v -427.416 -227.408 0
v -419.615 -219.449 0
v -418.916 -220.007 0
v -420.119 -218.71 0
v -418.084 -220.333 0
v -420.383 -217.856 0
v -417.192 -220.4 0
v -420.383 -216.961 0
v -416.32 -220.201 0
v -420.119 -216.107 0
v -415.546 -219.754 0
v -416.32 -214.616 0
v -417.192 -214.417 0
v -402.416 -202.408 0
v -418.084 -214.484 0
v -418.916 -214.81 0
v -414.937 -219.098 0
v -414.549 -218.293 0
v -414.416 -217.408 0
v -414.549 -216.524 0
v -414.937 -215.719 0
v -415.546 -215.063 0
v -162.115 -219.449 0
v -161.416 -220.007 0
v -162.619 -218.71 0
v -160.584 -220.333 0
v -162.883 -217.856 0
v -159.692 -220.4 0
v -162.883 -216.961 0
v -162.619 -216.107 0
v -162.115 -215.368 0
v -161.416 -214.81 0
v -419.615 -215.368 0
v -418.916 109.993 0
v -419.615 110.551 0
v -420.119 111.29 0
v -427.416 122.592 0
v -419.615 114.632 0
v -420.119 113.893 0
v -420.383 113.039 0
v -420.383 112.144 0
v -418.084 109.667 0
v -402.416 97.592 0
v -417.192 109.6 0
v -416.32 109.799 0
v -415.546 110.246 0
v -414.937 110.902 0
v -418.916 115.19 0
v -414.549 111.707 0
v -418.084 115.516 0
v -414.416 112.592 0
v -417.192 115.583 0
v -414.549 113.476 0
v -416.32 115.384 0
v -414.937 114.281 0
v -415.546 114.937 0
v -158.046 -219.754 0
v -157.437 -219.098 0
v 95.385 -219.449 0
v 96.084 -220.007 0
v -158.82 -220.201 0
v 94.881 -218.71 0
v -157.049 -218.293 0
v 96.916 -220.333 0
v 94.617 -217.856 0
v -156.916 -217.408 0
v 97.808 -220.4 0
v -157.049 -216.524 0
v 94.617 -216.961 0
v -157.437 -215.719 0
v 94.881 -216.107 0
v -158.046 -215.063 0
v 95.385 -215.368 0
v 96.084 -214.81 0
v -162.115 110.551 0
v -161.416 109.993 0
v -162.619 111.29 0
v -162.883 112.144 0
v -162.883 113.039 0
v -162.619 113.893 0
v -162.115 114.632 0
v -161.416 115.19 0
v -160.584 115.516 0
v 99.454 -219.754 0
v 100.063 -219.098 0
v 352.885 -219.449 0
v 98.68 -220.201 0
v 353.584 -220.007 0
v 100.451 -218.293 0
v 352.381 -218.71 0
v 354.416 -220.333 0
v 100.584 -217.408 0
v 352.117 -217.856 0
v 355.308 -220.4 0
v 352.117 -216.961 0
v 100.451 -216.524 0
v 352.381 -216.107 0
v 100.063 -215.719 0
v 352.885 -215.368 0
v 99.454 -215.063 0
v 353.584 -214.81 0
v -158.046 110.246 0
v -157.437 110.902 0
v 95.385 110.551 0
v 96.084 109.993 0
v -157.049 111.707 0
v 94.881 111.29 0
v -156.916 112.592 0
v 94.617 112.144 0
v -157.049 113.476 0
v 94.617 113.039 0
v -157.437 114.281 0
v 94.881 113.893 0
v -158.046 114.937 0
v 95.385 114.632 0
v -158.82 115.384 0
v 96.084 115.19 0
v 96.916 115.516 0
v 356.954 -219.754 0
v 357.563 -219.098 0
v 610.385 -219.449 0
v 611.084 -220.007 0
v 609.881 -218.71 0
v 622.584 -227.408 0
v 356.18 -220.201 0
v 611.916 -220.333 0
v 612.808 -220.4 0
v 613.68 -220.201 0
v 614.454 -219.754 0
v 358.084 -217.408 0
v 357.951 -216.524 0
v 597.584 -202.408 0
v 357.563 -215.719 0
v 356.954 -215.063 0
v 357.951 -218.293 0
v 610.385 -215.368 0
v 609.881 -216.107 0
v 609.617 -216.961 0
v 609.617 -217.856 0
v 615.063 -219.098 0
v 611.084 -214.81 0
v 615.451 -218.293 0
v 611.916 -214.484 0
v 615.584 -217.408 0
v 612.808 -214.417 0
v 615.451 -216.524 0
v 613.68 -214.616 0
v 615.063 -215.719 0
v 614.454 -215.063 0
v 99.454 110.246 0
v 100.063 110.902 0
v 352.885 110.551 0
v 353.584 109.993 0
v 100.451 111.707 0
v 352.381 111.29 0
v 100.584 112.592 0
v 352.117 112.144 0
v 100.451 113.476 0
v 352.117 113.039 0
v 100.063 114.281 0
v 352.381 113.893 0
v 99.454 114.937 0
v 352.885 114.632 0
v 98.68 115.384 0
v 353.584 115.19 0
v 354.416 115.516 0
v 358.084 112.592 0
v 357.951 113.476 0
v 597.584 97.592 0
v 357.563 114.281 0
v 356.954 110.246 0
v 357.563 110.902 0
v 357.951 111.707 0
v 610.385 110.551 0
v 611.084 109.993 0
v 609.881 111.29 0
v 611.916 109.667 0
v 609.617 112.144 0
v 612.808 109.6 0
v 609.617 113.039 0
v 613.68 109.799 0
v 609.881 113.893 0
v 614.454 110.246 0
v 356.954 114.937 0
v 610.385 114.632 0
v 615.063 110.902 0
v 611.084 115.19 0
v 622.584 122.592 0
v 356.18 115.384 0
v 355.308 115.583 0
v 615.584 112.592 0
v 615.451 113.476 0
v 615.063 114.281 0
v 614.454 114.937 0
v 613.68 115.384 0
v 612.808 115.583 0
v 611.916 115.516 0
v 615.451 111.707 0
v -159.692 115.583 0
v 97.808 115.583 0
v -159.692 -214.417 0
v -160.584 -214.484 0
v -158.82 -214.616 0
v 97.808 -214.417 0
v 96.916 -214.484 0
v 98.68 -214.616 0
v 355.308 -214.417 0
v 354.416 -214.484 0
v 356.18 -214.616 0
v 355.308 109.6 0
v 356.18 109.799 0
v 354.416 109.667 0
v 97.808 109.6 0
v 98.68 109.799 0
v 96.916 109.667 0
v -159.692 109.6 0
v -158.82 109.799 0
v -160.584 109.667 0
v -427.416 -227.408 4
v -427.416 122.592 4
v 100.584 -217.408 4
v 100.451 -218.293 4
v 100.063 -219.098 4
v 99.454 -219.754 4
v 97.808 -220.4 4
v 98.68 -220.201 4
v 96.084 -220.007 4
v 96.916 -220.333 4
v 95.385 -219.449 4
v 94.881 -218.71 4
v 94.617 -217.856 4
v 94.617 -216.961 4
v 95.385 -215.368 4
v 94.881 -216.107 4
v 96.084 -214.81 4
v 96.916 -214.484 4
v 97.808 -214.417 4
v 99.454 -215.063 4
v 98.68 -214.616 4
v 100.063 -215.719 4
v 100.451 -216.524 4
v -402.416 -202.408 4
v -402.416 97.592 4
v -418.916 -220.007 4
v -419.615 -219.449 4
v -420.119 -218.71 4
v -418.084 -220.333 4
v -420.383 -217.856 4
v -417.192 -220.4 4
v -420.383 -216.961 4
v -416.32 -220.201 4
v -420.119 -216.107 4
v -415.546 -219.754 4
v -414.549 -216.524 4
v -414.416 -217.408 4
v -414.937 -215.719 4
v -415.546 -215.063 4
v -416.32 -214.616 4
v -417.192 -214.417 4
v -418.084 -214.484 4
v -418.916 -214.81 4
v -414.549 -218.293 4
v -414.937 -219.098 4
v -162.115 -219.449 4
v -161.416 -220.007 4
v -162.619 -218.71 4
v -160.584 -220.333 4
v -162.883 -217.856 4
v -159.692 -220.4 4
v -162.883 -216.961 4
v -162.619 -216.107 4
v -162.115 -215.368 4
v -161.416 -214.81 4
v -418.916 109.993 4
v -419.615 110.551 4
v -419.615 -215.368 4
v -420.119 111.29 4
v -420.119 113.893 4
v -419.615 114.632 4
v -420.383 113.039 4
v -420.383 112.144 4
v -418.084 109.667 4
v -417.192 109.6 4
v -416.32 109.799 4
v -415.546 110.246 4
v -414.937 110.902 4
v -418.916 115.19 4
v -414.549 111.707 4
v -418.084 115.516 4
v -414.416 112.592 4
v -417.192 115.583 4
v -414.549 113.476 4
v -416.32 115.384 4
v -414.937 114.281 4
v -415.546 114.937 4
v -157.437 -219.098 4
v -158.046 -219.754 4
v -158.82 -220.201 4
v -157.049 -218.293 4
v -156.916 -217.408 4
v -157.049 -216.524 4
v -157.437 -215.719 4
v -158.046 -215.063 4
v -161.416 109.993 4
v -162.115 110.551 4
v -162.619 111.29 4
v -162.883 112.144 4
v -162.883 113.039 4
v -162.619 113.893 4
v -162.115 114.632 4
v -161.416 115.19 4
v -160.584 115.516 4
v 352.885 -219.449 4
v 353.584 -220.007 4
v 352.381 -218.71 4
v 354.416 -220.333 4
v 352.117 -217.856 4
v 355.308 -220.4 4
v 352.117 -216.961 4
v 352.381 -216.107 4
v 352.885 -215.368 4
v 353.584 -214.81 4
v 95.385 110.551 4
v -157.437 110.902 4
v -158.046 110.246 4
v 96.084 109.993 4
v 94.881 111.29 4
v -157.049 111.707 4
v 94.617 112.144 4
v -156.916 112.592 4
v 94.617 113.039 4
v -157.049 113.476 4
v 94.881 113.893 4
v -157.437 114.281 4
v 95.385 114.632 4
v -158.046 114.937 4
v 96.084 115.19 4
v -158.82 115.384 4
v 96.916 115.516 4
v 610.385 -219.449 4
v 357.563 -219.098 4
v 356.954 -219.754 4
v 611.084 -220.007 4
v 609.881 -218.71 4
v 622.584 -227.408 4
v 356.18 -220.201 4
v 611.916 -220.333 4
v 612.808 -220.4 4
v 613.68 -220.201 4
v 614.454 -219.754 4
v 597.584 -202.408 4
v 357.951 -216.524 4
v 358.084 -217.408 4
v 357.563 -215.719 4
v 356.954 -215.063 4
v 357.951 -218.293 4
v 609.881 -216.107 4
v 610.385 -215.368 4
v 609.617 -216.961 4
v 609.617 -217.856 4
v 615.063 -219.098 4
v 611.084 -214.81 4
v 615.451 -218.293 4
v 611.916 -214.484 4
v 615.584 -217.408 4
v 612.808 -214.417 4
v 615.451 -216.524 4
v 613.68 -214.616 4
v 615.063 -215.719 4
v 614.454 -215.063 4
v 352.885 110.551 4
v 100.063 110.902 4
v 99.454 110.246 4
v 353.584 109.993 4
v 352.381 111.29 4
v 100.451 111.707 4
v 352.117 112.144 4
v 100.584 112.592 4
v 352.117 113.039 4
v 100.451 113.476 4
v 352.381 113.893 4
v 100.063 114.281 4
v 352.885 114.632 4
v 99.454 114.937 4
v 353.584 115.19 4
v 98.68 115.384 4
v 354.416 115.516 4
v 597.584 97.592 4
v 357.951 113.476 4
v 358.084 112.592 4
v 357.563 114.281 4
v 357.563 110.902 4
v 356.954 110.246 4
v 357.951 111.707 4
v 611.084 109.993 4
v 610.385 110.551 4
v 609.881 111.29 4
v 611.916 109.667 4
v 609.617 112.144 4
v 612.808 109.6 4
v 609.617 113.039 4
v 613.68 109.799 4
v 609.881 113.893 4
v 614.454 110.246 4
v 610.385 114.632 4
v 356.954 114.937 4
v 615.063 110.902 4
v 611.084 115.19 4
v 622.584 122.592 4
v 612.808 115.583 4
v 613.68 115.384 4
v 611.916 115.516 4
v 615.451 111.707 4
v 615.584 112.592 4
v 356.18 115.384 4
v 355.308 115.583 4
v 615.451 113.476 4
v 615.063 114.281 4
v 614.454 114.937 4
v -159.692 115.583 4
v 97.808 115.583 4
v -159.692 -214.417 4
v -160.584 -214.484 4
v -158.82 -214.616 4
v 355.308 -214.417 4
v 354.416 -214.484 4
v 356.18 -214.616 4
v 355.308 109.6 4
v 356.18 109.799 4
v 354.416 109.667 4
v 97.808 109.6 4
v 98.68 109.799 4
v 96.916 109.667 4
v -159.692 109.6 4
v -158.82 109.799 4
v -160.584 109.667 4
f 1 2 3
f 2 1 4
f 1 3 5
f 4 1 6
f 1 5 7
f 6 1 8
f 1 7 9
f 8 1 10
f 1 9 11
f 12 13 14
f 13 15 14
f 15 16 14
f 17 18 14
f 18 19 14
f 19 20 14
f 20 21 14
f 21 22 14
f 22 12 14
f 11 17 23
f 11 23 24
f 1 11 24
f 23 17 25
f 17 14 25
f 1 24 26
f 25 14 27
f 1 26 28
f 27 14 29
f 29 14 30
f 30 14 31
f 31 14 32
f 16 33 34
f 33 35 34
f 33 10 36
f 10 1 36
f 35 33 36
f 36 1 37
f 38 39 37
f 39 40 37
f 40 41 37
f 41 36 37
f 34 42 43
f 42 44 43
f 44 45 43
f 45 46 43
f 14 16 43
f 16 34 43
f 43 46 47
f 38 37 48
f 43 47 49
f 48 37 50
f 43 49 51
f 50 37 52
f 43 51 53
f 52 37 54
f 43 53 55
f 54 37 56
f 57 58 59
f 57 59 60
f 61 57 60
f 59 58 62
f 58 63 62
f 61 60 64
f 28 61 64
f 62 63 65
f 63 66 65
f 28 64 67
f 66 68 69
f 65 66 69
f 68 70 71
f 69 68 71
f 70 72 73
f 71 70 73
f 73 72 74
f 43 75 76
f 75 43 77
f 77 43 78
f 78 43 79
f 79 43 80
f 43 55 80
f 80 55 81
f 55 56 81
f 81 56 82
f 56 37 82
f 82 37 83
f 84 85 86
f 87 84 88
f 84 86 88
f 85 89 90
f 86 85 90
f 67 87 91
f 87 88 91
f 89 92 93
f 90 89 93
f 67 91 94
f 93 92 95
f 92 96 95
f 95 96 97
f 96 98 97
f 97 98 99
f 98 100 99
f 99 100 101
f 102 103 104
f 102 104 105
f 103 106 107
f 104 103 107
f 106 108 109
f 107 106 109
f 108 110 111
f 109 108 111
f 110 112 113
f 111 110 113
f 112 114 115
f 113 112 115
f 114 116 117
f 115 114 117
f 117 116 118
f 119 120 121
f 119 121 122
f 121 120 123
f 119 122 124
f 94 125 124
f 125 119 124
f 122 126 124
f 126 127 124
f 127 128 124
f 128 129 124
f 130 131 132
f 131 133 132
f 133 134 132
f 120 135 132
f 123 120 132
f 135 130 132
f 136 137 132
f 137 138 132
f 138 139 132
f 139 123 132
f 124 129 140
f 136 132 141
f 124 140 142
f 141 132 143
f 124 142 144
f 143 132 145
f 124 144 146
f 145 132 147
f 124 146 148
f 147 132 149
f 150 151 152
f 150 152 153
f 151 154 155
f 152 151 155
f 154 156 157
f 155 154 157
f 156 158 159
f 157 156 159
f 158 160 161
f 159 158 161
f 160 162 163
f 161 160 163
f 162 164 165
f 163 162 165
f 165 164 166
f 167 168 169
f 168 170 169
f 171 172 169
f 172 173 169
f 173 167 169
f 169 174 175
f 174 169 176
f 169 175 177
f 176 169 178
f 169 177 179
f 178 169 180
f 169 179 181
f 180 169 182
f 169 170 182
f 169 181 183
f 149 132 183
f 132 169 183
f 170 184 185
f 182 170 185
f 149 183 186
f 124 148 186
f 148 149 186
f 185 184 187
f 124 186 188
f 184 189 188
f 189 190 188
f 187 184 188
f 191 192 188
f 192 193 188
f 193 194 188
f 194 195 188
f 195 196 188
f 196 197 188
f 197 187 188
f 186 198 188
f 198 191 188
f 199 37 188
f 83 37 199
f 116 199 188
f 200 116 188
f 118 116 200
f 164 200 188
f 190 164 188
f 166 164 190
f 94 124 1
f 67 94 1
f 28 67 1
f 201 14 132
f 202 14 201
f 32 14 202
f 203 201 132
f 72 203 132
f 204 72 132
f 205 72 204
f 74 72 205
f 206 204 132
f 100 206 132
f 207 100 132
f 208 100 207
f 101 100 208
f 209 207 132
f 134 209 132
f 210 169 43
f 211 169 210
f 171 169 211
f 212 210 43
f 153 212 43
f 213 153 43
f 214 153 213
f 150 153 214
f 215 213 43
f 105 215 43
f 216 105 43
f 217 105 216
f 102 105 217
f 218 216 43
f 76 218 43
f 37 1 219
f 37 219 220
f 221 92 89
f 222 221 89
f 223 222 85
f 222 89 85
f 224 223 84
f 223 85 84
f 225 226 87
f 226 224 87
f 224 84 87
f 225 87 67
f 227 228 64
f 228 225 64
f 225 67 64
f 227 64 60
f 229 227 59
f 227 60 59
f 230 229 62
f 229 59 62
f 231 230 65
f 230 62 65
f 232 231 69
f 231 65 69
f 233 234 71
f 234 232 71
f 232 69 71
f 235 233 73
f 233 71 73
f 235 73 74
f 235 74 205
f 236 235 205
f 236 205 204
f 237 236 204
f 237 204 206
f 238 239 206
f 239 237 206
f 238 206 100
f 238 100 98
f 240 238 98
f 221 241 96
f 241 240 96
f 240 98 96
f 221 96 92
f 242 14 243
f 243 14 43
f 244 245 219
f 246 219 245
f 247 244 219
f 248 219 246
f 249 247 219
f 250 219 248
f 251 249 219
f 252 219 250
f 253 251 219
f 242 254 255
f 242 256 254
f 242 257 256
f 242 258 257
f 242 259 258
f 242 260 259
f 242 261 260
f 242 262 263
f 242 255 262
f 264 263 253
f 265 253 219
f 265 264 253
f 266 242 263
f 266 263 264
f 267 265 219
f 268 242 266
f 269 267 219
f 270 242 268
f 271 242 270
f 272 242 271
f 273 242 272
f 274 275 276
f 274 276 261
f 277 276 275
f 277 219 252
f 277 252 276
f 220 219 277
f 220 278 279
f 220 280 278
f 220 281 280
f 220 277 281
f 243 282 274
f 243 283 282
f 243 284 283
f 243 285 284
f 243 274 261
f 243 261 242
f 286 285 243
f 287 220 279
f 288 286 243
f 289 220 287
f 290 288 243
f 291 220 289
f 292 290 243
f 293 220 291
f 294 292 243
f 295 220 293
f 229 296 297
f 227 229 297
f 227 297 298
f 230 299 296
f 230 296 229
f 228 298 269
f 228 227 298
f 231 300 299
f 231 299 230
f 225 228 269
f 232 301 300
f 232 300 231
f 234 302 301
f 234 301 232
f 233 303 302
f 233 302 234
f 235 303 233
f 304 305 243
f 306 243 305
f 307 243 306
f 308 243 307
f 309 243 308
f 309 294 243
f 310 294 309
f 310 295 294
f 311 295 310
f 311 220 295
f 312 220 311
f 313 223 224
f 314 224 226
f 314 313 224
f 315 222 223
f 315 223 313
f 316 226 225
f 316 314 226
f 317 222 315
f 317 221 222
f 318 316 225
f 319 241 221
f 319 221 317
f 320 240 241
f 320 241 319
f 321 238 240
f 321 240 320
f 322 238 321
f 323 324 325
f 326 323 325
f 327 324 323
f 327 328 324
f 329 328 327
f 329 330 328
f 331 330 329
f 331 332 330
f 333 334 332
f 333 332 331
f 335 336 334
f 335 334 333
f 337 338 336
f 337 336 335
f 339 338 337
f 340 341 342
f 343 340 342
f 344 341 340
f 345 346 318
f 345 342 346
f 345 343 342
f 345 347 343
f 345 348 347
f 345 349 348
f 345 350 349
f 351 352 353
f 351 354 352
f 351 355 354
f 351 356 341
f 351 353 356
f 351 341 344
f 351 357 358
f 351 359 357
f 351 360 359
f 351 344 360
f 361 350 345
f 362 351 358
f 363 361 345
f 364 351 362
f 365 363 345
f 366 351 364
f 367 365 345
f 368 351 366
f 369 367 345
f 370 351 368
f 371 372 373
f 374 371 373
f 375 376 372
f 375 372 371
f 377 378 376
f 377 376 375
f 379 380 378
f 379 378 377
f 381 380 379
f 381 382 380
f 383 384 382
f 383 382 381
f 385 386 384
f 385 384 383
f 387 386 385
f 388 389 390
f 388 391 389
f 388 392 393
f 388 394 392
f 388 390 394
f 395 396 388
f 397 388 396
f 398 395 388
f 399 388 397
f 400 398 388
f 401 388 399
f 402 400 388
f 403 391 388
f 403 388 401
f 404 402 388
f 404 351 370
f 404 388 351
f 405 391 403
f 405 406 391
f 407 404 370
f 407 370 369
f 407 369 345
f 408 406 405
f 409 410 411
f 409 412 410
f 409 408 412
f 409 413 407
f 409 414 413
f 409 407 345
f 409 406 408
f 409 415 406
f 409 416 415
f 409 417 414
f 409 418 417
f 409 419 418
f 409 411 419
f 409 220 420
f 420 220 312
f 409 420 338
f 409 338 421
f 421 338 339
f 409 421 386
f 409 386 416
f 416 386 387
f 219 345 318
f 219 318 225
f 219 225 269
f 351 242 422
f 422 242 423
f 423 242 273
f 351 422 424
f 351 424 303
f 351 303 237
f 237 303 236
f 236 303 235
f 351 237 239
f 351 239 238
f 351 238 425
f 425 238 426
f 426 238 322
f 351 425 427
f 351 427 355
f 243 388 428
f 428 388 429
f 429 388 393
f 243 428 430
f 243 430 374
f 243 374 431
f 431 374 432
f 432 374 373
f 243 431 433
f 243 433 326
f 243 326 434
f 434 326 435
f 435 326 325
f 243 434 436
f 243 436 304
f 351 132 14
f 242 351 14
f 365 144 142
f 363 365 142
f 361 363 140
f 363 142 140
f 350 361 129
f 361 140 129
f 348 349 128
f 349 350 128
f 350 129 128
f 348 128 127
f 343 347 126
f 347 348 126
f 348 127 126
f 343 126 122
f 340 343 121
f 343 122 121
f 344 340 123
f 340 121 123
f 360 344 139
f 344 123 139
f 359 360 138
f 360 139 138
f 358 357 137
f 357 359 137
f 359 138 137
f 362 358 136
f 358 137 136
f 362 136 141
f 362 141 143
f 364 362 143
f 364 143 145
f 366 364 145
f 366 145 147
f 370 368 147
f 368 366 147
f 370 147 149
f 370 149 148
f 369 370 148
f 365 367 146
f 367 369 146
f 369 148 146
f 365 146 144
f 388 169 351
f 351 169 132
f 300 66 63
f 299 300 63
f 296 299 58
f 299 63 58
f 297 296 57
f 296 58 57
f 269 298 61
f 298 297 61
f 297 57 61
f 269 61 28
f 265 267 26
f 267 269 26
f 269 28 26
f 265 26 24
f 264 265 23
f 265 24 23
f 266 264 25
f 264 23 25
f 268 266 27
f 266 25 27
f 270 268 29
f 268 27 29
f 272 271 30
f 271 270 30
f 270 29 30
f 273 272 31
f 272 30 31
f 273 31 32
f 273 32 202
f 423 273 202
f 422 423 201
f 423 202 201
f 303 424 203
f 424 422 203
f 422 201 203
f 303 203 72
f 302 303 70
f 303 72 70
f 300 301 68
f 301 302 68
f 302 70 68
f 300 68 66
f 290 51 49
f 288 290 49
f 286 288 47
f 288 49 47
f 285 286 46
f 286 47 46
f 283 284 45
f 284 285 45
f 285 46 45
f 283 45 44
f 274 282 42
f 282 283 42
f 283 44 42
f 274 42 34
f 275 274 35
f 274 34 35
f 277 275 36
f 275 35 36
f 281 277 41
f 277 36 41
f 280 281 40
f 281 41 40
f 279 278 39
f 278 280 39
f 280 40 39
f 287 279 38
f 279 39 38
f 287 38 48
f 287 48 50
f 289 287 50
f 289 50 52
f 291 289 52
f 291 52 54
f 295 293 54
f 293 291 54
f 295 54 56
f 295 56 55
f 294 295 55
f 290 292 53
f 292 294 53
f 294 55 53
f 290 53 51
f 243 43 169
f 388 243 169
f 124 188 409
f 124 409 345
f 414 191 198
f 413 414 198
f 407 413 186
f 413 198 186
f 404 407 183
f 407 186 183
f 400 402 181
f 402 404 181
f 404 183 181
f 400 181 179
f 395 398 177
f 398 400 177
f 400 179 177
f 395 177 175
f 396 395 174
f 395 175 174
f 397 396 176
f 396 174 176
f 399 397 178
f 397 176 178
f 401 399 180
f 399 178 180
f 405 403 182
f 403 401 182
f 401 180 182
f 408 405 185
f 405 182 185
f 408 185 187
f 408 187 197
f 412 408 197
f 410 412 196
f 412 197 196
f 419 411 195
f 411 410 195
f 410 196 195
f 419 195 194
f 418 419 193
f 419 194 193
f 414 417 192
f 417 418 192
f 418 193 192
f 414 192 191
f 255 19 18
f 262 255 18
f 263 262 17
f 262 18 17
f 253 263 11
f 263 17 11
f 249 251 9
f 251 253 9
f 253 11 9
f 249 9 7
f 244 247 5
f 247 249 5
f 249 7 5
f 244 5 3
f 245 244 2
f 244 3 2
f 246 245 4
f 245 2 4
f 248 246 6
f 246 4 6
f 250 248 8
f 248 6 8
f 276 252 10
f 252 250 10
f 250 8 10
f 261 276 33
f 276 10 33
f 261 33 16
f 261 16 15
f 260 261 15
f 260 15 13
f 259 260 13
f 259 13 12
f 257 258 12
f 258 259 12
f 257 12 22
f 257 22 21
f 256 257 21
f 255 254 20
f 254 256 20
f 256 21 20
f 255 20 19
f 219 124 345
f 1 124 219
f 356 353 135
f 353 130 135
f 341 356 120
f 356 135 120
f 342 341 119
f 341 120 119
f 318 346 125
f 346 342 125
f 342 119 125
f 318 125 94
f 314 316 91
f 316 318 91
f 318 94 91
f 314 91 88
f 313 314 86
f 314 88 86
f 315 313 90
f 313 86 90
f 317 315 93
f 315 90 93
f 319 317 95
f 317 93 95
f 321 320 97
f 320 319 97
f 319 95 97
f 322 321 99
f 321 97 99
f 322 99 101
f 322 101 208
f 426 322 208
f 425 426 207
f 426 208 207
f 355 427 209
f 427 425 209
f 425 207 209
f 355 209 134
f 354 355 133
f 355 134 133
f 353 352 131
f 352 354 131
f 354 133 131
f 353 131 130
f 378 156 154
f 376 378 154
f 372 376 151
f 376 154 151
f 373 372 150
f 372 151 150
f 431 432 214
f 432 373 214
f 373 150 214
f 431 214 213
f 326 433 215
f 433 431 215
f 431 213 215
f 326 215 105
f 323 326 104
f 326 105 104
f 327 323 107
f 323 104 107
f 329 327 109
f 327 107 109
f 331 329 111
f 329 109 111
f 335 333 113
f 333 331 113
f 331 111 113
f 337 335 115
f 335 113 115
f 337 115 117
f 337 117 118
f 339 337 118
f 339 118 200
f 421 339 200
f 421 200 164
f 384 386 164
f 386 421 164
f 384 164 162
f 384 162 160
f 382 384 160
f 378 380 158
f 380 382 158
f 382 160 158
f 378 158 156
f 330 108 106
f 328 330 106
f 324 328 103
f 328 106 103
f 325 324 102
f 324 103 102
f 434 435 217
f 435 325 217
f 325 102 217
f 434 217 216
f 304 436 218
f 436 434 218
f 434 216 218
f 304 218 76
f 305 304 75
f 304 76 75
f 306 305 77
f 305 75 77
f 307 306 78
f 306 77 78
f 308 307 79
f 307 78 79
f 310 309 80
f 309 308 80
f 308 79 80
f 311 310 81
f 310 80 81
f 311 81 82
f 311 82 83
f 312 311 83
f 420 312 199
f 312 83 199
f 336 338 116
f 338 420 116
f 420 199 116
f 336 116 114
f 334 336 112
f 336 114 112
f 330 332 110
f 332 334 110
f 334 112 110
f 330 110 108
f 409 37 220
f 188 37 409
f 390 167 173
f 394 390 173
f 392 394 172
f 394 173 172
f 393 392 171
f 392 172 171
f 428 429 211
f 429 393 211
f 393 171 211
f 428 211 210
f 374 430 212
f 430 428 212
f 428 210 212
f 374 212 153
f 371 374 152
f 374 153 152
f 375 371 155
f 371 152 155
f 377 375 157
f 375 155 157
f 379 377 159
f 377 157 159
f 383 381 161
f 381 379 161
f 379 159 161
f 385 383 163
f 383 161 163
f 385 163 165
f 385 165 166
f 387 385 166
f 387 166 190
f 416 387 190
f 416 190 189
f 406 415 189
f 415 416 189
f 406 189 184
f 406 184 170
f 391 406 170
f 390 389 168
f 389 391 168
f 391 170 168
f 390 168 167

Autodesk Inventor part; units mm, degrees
ref_plane "YZ Plane" through (0, 0, 0) normal (1, 0, 0) x (0, 1, 0)
ref_plane "XZ Plane" through (0, 0, 0) normal (0, 1, 0) x (-1, 0, 0)
ref_plane "XY Plane" through (0, 0, 0) normal (0, 0, 1) x (1, 0, 0)
sketch "Sketch1" plane through (0, 0, 0) normal (0, 0, 1) x (1, 0, 0)
  line L0 (97.5839, -20.2585) -> (97.5839, -84.5585) construction
  line L1 (97.5839, -52.4085) -> (19.6066, -52.4085)
  line L2 (622.5839, -227.4085) -> (-427.4161, -227.4085)
  line L3 (-427.4161, -227.4085) -> (-427.4161, 122.5915)
  line L4 (-427.4161, 122.5915) -> (622.5839, 122.5915)
  line L5 (622.5839, 122.5915) -> (622.5839, -227.4085)
  line L6 (622.5839, -227.4085) -> (-427.4161, 122.5915) construction
  line L7 (-427.4161, -227.4085) -> (622.5839, 122.5915) construction
  line L8 (-402.4161, 97.5915) -> (597.5839, 97.5915)
  line L9 (597.5839, 97.5915) -> (597.5839, -202.4085)
  line L10 (597.5839, -202.4085) -> (-402.4161, -202.4085)
  line L11 (-402.4161, -202.4085) -> (-402.4161, 97.5915)
  line L12 (-402.4161, 97.5915) -> (597.5839, -202.4085) construction
  line L13 (597.5839, 97.5915) -> (-402.4161, -202.4085) construction
  circle A0 centre (-417.4161, -217.4085) radius 3 projected
  circle A1 centre (-159.9161, -217.4085) radius 3 projected
  circle A2 centre (97.5839, 112.5915) radius 3 projected
  circle A3 centre (-159.9161, 112.5915) radius 3 projected
  circle A4 centre (-417.4161, 112.5915) radius 3 projected
  circle A5 centre (355.0839, 112.5915) radius 3 projected
  circle A6 centre (612.5839, 112.5915) radius 3 projected
  circle A7 centre (612.5839, -217.4085) radius 3 projected
  circle A8 centre (355.0839, -217.4085) radius 3 projected
  circle A9 centre (97.5839, -217.4085) radius 3 projected
  point P0 (0, 0)
  dimension "d0" = 1050
  dimension "d1" = 350
  dimension "d6" = 1000
  dimension "d7" = 300
extrude "Extrusion2" add sketch "Sketch1" along normal blind 4
properties part number "PrimaryCoilAluminiumLayer" material "Silver"
